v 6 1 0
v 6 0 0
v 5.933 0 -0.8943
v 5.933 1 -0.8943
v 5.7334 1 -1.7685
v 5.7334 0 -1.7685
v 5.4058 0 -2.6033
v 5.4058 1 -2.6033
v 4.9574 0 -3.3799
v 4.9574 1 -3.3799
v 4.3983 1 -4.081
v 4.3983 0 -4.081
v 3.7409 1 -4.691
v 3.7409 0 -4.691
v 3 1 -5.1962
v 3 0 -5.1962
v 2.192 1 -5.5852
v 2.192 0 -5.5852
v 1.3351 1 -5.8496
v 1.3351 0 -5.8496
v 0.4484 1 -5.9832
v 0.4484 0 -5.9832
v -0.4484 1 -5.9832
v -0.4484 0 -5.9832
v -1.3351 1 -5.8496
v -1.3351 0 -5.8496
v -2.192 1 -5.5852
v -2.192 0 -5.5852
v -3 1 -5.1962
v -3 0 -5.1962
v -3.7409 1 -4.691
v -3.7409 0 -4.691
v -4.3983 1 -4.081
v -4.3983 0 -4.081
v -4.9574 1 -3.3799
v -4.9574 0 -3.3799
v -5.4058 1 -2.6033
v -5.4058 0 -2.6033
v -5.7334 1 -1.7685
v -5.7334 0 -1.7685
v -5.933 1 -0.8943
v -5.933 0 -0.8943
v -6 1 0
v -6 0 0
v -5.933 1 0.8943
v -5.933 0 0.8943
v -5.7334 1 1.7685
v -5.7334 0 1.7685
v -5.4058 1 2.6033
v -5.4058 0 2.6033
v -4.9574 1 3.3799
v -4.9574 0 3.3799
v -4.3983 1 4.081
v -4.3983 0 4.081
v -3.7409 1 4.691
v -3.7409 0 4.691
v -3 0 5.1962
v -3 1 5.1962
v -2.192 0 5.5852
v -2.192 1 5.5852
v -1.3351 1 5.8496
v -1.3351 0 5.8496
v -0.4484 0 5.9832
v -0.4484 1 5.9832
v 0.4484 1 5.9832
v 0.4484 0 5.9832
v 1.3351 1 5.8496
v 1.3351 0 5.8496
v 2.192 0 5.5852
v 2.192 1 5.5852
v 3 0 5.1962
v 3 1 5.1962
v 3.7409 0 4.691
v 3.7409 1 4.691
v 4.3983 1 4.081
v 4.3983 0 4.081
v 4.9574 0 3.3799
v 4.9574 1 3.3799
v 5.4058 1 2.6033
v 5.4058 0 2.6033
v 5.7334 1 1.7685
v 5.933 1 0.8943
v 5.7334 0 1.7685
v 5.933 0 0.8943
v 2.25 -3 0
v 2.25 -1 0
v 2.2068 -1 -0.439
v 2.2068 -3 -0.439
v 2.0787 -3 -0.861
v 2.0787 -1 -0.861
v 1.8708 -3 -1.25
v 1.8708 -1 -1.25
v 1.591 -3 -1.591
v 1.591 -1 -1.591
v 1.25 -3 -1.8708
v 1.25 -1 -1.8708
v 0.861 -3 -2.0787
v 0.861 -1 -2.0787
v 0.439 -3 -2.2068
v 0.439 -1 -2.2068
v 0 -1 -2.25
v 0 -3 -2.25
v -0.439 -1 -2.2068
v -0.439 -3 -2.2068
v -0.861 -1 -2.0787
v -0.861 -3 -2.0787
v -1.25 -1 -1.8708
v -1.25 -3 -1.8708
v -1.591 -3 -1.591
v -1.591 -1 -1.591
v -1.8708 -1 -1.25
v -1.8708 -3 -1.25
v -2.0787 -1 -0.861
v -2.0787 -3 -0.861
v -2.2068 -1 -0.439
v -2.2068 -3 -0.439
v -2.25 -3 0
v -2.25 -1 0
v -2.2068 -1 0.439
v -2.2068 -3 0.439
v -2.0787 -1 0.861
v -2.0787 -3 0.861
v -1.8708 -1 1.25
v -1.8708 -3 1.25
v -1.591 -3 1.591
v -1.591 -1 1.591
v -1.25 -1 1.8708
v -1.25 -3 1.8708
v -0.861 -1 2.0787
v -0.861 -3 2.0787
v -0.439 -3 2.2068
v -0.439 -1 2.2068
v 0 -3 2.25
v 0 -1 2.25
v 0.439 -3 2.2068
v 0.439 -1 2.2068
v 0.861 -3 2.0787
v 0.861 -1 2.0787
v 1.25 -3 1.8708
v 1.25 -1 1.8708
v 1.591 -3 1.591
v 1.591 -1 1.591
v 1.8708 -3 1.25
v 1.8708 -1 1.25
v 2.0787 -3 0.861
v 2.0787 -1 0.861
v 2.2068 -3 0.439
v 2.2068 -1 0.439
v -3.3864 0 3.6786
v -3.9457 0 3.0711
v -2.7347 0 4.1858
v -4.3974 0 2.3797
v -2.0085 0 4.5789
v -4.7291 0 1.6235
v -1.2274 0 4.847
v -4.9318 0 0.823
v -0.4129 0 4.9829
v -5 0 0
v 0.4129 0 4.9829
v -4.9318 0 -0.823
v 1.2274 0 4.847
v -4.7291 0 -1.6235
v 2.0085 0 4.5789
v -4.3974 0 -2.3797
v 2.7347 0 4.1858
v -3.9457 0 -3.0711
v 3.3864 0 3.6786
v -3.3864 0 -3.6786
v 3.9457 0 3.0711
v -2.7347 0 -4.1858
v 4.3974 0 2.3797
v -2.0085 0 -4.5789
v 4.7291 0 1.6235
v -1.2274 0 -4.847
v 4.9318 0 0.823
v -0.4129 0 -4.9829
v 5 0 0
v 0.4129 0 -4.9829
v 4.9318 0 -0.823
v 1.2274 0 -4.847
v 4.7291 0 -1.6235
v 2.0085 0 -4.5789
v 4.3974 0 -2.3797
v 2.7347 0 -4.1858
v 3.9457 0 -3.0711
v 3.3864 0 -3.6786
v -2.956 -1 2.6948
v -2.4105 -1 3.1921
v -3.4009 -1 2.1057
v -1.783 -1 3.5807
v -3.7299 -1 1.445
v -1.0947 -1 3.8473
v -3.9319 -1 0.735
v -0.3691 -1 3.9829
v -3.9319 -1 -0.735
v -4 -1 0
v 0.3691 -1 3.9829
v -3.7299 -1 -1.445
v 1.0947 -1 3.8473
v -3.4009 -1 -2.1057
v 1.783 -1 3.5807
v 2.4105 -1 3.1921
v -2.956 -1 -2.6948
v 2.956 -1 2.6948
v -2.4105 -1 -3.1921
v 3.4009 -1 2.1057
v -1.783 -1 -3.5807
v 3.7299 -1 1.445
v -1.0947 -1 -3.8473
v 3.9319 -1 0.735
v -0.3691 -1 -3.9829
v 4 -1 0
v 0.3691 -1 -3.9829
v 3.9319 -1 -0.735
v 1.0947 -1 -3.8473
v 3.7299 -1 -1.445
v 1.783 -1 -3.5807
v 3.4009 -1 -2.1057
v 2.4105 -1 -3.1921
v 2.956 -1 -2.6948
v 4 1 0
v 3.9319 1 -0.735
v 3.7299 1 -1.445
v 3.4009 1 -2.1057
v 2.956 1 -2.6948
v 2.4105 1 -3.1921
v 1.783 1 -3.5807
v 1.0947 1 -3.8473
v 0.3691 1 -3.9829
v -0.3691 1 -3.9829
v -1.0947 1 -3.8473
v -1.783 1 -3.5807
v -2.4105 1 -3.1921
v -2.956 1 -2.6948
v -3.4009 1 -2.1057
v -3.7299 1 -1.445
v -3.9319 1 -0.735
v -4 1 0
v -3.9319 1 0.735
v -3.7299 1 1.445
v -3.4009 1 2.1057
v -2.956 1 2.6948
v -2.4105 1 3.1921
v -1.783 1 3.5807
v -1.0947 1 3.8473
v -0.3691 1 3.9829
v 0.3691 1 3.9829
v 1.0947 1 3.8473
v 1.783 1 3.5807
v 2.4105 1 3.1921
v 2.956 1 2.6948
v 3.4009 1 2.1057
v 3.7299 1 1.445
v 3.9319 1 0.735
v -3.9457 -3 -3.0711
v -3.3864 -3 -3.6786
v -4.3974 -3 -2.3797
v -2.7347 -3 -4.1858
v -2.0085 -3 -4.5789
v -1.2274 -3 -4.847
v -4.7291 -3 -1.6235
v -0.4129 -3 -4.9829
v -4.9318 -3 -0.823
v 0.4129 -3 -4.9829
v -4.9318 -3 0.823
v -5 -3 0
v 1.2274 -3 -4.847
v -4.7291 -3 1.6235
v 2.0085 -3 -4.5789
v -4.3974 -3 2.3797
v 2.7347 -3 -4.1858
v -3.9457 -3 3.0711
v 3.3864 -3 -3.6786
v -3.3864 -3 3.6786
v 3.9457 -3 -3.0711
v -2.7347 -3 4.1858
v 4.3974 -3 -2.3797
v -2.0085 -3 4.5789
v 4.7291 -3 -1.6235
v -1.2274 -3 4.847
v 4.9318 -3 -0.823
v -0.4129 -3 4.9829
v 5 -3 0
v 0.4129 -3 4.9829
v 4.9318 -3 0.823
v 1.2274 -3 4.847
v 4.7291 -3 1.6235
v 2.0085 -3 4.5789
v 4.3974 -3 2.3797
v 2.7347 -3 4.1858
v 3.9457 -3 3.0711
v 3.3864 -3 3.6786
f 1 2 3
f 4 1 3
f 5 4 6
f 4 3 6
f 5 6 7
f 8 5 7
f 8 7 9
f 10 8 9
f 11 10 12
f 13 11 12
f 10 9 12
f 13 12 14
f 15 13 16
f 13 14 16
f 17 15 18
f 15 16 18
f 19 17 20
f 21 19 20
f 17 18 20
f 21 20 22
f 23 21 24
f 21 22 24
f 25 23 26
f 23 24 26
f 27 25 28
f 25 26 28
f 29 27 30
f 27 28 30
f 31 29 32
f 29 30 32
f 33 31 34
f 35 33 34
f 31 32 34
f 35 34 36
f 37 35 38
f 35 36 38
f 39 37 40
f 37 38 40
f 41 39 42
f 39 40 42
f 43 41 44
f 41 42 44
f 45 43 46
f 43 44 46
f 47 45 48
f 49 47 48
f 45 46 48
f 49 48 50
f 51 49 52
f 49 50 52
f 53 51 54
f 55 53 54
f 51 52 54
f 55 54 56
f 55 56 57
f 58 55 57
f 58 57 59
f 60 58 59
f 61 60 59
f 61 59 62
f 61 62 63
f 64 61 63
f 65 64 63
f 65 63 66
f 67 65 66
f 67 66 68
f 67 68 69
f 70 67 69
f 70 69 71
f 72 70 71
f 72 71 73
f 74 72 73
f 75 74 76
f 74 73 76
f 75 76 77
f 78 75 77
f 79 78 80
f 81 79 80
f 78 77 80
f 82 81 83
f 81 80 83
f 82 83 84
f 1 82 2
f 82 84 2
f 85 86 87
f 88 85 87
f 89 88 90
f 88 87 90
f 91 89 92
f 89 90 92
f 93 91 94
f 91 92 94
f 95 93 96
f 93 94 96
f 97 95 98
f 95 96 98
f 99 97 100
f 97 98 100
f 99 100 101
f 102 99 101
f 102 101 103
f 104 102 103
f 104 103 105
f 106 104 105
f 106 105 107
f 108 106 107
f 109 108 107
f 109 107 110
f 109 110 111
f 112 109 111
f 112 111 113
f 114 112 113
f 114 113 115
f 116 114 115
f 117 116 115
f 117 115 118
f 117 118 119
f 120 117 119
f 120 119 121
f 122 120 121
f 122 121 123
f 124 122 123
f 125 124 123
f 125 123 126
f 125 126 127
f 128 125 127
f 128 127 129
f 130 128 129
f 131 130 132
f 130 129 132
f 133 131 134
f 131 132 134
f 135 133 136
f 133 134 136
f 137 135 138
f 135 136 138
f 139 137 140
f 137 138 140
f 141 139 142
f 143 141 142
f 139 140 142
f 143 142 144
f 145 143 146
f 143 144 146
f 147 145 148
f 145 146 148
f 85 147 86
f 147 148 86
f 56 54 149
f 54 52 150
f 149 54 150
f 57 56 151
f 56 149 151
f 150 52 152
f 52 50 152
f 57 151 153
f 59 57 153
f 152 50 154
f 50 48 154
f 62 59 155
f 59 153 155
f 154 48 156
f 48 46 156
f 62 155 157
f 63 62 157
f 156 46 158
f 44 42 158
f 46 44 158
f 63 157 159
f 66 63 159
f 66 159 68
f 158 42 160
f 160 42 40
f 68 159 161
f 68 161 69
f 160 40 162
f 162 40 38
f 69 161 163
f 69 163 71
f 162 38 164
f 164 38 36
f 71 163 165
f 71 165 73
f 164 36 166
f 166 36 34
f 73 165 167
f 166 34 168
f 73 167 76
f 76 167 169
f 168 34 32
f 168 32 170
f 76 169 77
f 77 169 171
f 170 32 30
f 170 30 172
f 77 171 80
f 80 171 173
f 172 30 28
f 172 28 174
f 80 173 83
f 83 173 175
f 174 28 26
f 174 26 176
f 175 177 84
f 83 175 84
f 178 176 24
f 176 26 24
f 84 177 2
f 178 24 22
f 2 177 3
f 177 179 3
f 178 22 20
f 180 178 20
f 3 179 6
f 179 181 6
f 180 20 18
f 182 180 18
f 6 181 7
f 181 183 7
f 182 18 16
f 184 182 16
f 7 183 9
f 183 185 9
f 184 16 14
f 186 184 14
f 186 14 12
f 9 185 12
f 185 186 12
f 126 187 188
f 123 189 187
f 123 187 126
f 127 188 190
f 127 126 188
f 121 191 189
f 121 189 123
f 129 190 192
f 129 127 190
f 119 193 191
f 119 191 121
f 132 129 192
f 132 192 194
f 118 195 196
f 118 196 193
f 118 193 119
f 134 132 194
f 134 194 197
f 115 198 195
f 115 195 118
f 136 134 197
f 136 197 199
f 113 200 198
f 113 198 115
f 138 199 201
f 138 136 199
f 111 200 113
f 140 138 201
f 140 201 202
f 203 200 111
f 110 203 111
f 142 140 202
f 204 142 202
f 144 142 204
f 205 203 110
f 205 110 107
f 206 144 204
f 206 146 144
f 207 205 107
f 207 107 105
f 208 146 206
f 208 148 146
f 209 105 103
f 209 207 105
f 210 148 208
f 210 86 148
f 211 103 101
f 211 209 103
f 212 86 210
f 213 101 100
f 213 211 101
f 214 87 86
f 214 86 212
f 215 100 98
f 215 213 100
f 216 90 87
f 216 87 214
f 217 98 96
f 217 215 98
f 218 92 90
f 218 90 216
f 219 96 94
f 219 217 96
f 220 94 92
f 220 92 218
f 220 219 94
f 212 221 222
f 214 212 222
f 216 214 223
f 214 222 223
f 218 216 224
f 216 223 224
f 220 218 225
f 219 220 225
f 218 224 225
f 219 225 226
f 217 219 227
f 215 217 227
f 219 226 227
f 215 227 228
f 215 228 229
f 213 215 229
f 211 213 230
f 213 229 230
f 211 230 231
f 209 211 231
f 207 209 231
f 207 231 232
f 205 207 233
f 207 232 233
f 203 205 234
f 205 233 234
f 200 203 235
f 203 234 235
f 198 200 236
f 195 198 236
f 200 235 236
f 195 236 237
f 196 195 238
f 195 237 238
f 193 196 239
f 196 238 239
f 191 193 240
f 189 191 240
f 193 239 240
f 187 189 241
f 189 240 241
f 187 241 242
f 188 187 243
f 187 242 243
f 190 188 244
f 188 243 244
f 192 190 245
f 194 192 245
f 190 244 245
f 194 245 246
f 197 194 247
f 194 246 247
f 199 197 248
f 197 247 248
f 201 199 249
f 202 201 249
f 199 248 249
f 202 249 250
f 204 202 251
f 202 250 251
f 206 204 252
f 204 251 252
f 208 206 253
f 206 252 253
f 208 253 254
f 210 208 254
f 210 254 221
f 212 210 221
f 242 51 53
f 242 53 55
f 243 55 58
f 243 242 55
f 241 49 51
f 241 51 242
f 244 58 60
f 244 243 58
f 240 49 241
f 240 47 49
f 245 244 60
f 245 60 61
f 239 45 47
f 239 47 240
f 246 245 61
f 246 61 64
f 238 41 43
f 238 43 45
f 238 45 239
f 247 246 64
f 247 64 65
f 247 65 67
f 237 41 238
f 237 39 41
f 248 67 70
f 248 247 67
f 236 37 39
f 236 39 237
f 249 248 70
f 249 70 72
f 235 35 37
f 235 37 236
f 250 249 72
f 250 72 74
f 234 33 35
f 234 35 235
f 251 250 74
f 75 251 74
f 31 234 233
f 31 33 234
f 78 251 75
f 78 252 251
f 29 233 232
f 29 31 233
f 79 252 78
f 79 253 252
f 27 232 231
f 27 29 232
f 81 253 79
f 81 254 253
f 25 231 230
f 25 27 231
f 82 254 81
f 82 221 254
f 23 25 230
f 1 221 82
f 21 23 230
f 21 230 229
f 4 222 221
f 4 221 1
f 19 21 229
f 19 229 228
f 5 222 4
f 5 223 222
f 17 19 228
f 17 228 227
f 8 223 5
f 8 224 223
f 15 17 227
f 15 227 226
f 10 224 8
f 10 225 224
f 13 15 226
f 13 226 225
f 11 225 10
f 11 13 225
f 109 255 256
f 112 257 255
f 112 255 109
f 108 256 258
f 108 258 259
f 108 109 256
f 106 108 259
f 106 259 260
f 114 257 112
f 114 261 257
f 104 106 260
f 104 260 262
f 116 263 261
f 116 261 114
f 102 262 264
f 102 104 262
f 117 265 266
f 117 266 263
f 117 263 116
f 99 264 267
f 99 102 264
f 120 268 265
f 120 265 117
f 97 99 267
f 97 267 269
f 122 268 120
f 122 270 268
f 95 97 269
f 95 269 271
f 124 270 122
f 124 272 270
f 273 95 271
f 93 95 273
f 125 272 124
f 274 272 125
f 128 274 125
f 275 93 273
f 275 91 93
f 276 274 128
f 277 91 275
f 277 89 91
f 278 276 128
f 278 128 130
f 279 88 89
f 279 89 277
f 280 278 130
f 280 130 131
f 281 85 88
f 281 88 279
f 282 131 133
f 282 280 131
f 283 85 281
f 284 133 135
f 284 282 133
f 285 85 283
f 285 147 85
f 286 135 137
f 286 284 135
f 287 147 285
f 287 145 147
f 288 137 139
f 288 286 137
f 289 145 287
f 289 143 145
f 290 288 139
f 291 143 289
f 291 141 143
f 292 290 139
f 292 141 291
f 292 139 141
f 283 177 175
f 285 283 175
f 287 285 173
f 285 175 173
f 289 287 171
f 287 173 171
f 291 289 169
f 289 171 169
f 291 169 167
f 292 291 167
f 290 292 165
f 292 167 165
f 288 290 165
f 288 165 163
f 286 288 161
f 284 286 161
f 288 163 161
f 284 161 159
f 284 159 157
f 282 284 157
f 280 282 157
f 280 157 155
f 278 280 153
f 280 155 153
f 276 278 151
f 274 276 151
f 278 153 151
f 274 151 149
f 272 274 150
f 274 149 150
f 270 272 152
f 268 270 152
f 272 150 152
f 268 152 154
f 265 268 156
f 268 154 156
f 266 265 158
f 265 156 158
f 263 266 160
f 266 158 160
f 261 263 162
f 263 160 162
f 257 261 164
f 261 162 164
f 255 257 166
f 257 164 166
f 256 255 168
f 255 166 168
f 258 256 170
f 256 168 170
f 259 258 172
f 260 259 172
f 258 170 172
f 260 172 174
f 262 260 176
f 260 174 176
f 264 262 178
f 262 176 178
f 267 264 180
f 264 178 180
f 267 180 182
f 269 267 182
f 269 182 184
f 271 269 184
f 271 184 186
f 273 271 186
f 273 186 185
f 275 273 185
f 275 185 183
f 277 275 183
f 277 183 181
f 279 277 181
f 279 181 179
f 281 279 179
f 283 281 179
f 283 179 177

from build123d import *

# Parameters (mm, degrees)
SKETCH_1_R          = 6
EXTRUDE_1_DEPTH     = 1
SKETCH_2_R          = 5
EXTRUDE_2_DEPTH     = 3
SKETCH_3_R          = 4
CUT_EXTRUDE_1_DEPTH = 2
SKETCH_4_R          = 2.25
CUT_EXTRUDE_2_DEPTH = 10


with BuildPart() as part:
    # 草图1 → 凸台-拉伸1 (new body)
    with BuildSketch(Plane(origin=(0, 0, 0), x_dir=(1, 0, 0), z_dir=(0, 1, 0))):
        Circle(SKETCH_1_R)
    extrude(amount=EXTRUDE_1_DEPTH)

    # 草图2 → 凸台-拉伸2 (add)
    with BuildSketch(Plane.XZ):
        Circle(SKETCH_2_R)
    extrude(amount=EXTRUDE_2_DEPTH)

    # 草图3 → 切除-拉伸1 (cut)
    with BuildSketch(Plane(origin=(0, 1, 0), x_dir=(1, 0, 0), z_dir=(0, 1, 0))):
        Circle(SKETCH_3_R)
    extrude(amount=-CUT_EXTRUDE_1_DEPTH, mode=Mode.SUBTRACT)

    # 草图4 → 切除-拉伸2 (cut)
    with BuildSketch(Plane(origin=(0, -1, 0), x_dir=(1, 0, 0), z_dir=(0, 1, 0))):
        Circle(SKETCH_4_R)
    extrude(amount=-CUT_EXTRUDE_2_DEPTH, mode=Mode.SUBTRACT)


solid = part.part
